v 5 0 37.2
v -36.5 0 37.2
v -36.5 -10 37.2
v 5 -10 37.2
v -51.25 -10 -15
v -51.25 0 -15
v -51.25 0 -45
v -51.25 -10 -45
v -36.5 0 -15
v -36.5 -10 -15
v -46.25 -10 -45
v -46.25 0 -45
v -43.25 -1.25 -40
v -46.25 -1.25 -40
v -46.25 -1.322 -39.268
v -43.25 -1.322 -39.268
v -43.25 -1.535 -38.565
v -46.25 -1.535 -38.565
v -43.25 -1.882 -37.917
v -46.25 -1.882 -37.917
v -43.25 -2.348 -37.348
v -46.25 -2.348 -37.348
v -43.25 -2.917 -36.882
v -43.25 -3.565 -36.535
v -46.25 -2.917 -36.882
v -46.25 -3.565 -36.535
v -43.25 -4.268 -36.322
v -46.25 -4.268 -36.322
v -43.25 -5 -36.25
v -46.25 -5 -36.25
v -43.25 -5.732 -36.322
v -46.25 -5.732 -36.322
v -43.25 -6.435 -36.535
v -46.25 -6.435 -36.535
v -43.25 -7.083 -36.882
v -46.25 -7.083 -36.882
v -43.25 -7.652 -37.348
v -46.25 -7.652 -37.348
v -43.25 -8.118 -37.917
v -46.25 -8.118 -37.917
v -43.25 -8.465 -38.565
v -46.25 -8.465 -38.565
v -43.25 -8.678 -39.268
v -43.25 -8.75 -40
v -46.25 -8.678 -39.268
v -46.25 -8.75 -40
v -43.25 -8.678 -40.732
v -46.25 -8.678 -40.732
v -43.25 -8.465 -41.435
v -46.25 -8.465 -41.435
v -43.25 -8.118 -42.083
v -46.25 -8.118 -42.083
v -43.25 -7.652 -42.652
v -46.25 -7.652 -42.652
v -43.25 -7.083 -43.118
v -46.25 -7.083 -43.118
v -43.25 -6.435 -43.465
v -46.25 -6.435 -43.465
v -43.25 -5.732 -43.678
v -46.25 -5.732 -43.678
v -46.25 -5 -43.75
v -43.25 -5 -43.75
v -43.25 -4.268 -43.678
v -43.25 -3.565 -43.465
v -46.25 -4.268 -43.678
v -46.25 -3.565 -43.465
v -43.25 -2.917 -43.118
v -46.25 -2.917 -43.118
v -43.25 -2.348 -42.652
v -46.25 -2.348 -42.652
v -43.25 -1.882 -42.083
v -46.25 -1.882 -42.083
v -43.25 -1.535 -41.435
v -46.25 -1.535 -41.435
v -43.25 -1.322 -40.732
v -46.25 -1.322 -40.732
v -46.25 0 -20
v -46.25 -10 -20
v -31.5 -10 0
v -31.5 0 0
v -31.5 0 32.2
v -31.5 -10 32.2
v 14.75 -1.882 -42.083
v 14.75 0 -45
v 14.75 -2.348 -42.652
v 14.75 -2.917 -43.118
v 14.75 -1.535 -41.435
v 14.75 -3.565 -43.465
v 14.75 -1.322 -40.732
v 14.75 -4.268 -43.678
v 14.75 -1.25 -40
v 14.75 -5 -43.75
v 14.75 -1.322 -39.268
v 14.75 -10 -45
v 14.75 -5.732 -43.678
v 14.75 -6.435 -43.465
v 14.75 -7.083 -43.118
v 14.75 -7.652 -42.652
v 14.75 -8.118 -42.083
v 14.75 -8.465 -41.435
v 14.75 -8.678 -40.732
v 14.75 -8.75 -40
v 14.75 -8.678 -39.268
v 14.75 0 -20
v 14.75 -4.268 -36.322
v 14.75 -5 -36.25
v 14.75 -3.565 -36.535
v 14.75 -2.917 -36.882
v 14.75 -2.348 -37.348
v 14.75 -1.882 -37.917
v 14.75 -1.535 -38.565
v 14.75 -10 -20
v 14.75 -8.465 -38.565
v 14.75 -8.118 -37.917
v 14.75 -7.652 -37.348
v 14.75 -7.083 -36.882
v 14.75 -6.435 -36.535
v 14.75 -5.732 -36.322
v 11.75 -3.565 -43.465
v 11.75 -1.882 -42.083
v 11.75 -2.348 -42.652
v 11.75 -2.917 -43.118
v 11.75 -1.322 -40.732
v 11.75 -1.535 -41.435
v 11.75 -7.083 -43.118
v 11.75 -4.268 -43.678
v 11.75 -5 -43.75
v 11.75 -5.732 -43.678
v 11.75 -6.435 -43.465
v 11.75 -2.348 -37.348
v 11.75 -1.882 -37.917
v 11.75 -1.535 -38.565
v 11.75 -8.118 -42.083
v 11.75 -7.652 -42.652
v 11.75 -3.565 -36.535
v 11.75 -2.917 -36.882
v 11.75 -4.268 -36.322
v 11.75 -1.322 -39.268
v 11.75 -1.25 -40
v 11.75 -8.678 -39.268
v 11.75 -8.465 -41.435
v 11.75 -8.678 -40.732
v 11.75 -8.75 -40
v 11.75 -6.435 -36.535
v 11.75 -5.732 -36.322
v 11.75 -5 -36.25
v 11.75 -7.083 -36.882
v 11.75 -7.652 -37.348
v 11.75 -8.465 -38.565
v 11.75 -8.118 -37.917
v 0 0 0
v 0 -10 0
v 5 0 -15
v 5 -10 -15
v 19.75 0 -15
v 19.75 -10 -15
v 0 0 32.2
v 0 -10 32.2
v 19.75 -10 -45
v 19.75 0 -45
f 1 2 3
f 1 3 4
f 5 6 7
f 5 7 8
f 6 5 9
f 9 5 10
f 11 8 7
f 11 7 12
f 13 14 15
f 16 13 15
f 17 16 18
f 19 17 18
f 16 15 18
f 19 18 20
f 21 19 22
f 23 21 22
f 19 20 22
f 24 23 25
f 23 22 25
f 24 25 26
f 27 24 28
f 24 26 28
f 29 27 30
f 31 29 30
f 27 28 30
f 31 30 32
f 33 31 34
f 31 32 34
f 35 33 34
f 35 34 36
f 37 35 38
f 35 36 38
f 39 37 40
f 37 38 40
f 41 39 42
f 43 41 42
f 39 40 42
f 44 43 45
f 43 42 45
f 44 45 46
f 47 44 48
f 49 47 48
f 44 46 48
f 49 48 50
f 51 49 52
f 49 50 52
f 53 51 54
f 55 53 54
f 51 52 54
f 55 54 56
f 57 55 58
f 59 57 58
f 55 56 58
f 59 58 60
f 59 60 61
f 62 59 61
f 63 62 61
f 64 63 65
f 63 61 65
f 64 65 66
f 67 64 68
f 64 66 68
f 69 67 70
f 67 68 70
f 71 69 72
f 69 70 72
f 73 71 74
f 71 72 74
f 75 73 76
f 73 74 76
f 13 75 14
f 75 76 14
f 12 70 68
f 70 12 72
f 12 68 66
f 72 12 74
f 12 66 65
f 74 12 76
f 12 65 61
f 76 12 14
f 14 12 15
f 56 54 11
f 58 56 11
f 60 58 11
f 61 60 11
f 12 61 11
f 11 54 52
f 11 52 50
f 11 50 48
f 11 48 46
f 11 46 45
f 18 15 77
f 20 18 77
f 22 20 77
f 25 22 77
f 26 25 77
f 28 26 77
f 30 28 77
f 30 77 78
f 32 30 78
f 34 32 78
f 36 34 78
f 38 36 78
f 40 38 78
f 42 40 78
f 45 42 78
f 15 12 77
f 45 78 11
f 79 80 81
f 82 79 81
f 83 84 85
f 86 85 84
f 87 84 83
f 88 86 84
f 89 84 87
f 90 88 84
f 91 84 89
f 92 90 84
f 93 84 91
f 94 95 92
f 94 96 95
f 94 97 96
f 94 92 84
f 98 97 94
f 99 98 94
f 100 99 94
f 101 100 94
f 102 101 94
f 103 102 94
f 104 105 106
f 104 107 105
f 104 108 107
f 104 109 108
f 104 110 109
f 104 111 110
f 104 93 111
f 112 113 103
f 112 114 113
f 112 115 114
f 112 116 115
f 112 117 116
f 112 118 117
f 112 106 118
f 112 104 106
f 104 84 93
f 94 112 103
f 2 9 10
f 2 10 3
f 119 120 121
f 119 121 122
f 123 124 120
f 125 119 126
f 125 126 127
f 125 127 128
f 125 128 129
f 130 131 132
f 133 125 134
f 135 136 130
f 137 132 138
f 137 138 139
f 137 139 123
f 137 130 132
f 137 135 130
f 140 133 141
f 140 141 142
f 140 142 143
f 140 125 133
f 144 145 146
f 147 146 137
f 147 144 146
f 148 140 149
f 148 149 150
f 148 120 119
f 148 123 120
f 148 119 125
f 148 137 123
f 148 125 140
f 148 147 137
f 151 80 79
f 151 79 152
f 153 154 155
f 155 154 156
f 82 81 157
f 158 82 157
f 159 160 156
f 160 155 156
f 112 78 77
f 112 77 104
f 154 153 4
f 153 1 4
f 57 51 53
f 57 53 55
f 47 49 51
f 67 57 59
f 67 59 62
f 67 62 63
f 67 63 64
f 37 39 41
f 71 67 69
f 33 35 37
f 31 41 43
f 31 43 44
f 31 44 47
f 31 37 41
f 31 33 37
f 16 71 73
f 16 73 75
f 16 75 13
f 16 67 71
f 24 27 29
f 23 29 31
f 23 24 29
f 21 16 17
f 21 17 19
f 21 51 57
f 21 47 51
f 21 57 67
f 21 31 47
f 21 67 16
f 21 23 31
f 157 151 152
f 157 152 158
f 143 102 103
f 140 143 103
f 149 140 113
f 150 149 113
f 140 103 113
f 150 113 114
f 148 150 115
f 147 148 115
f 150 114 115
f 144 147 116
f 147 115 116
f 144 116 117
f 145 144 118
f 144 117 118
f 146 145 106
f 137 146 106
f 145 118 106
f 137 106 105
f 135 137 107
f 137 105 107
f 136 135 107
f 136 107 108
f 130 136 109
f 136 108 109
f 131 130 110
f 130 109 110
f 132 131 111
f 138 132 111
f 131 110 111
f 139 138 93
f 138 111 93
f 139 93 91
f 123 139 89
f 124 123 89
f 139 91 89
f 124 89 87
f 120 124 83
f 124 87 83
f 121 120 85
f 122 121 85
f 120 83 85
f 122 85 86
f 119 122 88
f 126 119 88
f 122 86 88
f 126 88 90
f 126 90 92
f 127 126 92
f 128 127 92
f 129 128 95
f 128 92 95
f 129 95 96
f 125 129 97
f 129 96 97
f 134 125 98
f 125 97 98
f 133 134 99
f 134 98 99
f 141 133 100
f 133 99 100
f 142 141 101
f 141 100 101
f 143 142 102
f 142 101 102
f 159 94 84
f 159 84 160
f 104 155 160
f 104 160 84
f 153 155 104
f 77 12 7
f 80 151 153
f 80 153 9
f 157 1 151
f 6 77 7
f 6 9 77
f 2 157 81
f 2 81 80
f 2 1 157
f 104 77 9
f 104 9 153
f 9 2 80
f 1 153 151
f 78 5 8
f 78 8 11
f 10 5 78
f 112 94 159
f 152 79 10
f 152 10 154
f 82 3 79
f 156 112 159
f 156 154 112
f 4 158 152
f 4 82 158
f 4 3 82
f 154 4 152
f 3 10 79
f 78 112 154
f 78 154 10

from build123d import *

# Parameters (mm, degrees)
F1_W      = 41.5
F1_H      = 42.2
F2_DEPTH  = 10
F0_W      = 31.5
F0_H      = 32.2
F3_DEPTH  = 25
F4_W      = 5
F4_H      = 10
F5_DEPTH  = 10
F6_W      = 71
F6_H      = 10
F7_DEPTH  = 5
F8_W      = 5
F8_H      = 10
F9_DEPTH  = 25
F11_R     = 3.75
F12_DEPTH = 3
F13_W     = 31.5
F13_H     = 10
F14_DEPTH = 10
F10_R     = 3.75
F15_DEPTH = 3


with BuildPart() as f2:
    # F1 (on Front) → F2 (new body)
    with BuildSketch(Plane.XZ):
        with Locations((-15.75, 16.1)):
            Rectangle(F1_W, F1_H)
    extrude(amount=F2_DEPTH)

    # F0 (on Front) → F3 (cut)
    with BuildSketch(Plane.XZ):
        with Locations((-15.75, 16.1)):
            Rectangle(F0_W, F0_H)
    extrude(amount=F3_DEPTH, mode=Mode.SUBTRACT)

    # F4 (on face) → F5 (join)
    with BuildSketch(Plane(origin=(0, 0, -5), x_dir=(1, 0, 0), z_dir=(0, 0, -1))):
        with Locations((2.5, 5)):
            Rectangle(F4_W, F4_H)
        with Locations((-34, 5)):
            Rectangle(F4_W, F4_H)
    extrude(amount=F5_DEPTH)

    # F6 (on face) → F7 (join)
    with BuildSketch(Plane(origin=(0, 0, -15), x_dir=(1, 0, 0), z_dir=(0, 0, -1))):
        with Locations((-15.75, 5)):
            Rectangle(F6_W, F6_H)
    extrude(amount=F7_DEPTH)

    # F8 (on face) → F9 (join)
    with BuildSketch(Plane(origin=(0, 0, -20), x_dir=(1, 0, 0), z_dir=(0, 0, -1))):
        with Locations((17.25, 5)):
            Rectangle(F8_W, F8_H)
        with Locations((-48.75, 5)):
            Rectangle(F8_W, F8_H)
    extrude(amount=F9_DEPTH)

    # F11 (on face) → F12 (join)
    with BuildSketch(Plane.YZ.offset(-46.25)):
        with Locations((-5, -40)):
            Circle(F11_R)
    extrude(amount=F12_DEPTH)

    # F13 (on face) → F14 (join)
    with BuildSketch(Plane(origin=(0, 0, 0), x_dir=(-1, 0, 0), z_dir=(0, 1, 0))):
        with Locations((15.75, -10)):
            Rectangle(F13_W, F13_H)
    extrude(amount=-F14_DEPTH)

    # F10 (on face) → F15 (join)
    with BuildSketch(Plane(origin=(14.75, 0, 0), x_dir=(0, -1, 0), z_dir=(-1, 0, 0))):
        with Locations((5, -40)):
            Circle(F10_R)
    extrude(amount=F15_DEPTH)


solid = f2.part
